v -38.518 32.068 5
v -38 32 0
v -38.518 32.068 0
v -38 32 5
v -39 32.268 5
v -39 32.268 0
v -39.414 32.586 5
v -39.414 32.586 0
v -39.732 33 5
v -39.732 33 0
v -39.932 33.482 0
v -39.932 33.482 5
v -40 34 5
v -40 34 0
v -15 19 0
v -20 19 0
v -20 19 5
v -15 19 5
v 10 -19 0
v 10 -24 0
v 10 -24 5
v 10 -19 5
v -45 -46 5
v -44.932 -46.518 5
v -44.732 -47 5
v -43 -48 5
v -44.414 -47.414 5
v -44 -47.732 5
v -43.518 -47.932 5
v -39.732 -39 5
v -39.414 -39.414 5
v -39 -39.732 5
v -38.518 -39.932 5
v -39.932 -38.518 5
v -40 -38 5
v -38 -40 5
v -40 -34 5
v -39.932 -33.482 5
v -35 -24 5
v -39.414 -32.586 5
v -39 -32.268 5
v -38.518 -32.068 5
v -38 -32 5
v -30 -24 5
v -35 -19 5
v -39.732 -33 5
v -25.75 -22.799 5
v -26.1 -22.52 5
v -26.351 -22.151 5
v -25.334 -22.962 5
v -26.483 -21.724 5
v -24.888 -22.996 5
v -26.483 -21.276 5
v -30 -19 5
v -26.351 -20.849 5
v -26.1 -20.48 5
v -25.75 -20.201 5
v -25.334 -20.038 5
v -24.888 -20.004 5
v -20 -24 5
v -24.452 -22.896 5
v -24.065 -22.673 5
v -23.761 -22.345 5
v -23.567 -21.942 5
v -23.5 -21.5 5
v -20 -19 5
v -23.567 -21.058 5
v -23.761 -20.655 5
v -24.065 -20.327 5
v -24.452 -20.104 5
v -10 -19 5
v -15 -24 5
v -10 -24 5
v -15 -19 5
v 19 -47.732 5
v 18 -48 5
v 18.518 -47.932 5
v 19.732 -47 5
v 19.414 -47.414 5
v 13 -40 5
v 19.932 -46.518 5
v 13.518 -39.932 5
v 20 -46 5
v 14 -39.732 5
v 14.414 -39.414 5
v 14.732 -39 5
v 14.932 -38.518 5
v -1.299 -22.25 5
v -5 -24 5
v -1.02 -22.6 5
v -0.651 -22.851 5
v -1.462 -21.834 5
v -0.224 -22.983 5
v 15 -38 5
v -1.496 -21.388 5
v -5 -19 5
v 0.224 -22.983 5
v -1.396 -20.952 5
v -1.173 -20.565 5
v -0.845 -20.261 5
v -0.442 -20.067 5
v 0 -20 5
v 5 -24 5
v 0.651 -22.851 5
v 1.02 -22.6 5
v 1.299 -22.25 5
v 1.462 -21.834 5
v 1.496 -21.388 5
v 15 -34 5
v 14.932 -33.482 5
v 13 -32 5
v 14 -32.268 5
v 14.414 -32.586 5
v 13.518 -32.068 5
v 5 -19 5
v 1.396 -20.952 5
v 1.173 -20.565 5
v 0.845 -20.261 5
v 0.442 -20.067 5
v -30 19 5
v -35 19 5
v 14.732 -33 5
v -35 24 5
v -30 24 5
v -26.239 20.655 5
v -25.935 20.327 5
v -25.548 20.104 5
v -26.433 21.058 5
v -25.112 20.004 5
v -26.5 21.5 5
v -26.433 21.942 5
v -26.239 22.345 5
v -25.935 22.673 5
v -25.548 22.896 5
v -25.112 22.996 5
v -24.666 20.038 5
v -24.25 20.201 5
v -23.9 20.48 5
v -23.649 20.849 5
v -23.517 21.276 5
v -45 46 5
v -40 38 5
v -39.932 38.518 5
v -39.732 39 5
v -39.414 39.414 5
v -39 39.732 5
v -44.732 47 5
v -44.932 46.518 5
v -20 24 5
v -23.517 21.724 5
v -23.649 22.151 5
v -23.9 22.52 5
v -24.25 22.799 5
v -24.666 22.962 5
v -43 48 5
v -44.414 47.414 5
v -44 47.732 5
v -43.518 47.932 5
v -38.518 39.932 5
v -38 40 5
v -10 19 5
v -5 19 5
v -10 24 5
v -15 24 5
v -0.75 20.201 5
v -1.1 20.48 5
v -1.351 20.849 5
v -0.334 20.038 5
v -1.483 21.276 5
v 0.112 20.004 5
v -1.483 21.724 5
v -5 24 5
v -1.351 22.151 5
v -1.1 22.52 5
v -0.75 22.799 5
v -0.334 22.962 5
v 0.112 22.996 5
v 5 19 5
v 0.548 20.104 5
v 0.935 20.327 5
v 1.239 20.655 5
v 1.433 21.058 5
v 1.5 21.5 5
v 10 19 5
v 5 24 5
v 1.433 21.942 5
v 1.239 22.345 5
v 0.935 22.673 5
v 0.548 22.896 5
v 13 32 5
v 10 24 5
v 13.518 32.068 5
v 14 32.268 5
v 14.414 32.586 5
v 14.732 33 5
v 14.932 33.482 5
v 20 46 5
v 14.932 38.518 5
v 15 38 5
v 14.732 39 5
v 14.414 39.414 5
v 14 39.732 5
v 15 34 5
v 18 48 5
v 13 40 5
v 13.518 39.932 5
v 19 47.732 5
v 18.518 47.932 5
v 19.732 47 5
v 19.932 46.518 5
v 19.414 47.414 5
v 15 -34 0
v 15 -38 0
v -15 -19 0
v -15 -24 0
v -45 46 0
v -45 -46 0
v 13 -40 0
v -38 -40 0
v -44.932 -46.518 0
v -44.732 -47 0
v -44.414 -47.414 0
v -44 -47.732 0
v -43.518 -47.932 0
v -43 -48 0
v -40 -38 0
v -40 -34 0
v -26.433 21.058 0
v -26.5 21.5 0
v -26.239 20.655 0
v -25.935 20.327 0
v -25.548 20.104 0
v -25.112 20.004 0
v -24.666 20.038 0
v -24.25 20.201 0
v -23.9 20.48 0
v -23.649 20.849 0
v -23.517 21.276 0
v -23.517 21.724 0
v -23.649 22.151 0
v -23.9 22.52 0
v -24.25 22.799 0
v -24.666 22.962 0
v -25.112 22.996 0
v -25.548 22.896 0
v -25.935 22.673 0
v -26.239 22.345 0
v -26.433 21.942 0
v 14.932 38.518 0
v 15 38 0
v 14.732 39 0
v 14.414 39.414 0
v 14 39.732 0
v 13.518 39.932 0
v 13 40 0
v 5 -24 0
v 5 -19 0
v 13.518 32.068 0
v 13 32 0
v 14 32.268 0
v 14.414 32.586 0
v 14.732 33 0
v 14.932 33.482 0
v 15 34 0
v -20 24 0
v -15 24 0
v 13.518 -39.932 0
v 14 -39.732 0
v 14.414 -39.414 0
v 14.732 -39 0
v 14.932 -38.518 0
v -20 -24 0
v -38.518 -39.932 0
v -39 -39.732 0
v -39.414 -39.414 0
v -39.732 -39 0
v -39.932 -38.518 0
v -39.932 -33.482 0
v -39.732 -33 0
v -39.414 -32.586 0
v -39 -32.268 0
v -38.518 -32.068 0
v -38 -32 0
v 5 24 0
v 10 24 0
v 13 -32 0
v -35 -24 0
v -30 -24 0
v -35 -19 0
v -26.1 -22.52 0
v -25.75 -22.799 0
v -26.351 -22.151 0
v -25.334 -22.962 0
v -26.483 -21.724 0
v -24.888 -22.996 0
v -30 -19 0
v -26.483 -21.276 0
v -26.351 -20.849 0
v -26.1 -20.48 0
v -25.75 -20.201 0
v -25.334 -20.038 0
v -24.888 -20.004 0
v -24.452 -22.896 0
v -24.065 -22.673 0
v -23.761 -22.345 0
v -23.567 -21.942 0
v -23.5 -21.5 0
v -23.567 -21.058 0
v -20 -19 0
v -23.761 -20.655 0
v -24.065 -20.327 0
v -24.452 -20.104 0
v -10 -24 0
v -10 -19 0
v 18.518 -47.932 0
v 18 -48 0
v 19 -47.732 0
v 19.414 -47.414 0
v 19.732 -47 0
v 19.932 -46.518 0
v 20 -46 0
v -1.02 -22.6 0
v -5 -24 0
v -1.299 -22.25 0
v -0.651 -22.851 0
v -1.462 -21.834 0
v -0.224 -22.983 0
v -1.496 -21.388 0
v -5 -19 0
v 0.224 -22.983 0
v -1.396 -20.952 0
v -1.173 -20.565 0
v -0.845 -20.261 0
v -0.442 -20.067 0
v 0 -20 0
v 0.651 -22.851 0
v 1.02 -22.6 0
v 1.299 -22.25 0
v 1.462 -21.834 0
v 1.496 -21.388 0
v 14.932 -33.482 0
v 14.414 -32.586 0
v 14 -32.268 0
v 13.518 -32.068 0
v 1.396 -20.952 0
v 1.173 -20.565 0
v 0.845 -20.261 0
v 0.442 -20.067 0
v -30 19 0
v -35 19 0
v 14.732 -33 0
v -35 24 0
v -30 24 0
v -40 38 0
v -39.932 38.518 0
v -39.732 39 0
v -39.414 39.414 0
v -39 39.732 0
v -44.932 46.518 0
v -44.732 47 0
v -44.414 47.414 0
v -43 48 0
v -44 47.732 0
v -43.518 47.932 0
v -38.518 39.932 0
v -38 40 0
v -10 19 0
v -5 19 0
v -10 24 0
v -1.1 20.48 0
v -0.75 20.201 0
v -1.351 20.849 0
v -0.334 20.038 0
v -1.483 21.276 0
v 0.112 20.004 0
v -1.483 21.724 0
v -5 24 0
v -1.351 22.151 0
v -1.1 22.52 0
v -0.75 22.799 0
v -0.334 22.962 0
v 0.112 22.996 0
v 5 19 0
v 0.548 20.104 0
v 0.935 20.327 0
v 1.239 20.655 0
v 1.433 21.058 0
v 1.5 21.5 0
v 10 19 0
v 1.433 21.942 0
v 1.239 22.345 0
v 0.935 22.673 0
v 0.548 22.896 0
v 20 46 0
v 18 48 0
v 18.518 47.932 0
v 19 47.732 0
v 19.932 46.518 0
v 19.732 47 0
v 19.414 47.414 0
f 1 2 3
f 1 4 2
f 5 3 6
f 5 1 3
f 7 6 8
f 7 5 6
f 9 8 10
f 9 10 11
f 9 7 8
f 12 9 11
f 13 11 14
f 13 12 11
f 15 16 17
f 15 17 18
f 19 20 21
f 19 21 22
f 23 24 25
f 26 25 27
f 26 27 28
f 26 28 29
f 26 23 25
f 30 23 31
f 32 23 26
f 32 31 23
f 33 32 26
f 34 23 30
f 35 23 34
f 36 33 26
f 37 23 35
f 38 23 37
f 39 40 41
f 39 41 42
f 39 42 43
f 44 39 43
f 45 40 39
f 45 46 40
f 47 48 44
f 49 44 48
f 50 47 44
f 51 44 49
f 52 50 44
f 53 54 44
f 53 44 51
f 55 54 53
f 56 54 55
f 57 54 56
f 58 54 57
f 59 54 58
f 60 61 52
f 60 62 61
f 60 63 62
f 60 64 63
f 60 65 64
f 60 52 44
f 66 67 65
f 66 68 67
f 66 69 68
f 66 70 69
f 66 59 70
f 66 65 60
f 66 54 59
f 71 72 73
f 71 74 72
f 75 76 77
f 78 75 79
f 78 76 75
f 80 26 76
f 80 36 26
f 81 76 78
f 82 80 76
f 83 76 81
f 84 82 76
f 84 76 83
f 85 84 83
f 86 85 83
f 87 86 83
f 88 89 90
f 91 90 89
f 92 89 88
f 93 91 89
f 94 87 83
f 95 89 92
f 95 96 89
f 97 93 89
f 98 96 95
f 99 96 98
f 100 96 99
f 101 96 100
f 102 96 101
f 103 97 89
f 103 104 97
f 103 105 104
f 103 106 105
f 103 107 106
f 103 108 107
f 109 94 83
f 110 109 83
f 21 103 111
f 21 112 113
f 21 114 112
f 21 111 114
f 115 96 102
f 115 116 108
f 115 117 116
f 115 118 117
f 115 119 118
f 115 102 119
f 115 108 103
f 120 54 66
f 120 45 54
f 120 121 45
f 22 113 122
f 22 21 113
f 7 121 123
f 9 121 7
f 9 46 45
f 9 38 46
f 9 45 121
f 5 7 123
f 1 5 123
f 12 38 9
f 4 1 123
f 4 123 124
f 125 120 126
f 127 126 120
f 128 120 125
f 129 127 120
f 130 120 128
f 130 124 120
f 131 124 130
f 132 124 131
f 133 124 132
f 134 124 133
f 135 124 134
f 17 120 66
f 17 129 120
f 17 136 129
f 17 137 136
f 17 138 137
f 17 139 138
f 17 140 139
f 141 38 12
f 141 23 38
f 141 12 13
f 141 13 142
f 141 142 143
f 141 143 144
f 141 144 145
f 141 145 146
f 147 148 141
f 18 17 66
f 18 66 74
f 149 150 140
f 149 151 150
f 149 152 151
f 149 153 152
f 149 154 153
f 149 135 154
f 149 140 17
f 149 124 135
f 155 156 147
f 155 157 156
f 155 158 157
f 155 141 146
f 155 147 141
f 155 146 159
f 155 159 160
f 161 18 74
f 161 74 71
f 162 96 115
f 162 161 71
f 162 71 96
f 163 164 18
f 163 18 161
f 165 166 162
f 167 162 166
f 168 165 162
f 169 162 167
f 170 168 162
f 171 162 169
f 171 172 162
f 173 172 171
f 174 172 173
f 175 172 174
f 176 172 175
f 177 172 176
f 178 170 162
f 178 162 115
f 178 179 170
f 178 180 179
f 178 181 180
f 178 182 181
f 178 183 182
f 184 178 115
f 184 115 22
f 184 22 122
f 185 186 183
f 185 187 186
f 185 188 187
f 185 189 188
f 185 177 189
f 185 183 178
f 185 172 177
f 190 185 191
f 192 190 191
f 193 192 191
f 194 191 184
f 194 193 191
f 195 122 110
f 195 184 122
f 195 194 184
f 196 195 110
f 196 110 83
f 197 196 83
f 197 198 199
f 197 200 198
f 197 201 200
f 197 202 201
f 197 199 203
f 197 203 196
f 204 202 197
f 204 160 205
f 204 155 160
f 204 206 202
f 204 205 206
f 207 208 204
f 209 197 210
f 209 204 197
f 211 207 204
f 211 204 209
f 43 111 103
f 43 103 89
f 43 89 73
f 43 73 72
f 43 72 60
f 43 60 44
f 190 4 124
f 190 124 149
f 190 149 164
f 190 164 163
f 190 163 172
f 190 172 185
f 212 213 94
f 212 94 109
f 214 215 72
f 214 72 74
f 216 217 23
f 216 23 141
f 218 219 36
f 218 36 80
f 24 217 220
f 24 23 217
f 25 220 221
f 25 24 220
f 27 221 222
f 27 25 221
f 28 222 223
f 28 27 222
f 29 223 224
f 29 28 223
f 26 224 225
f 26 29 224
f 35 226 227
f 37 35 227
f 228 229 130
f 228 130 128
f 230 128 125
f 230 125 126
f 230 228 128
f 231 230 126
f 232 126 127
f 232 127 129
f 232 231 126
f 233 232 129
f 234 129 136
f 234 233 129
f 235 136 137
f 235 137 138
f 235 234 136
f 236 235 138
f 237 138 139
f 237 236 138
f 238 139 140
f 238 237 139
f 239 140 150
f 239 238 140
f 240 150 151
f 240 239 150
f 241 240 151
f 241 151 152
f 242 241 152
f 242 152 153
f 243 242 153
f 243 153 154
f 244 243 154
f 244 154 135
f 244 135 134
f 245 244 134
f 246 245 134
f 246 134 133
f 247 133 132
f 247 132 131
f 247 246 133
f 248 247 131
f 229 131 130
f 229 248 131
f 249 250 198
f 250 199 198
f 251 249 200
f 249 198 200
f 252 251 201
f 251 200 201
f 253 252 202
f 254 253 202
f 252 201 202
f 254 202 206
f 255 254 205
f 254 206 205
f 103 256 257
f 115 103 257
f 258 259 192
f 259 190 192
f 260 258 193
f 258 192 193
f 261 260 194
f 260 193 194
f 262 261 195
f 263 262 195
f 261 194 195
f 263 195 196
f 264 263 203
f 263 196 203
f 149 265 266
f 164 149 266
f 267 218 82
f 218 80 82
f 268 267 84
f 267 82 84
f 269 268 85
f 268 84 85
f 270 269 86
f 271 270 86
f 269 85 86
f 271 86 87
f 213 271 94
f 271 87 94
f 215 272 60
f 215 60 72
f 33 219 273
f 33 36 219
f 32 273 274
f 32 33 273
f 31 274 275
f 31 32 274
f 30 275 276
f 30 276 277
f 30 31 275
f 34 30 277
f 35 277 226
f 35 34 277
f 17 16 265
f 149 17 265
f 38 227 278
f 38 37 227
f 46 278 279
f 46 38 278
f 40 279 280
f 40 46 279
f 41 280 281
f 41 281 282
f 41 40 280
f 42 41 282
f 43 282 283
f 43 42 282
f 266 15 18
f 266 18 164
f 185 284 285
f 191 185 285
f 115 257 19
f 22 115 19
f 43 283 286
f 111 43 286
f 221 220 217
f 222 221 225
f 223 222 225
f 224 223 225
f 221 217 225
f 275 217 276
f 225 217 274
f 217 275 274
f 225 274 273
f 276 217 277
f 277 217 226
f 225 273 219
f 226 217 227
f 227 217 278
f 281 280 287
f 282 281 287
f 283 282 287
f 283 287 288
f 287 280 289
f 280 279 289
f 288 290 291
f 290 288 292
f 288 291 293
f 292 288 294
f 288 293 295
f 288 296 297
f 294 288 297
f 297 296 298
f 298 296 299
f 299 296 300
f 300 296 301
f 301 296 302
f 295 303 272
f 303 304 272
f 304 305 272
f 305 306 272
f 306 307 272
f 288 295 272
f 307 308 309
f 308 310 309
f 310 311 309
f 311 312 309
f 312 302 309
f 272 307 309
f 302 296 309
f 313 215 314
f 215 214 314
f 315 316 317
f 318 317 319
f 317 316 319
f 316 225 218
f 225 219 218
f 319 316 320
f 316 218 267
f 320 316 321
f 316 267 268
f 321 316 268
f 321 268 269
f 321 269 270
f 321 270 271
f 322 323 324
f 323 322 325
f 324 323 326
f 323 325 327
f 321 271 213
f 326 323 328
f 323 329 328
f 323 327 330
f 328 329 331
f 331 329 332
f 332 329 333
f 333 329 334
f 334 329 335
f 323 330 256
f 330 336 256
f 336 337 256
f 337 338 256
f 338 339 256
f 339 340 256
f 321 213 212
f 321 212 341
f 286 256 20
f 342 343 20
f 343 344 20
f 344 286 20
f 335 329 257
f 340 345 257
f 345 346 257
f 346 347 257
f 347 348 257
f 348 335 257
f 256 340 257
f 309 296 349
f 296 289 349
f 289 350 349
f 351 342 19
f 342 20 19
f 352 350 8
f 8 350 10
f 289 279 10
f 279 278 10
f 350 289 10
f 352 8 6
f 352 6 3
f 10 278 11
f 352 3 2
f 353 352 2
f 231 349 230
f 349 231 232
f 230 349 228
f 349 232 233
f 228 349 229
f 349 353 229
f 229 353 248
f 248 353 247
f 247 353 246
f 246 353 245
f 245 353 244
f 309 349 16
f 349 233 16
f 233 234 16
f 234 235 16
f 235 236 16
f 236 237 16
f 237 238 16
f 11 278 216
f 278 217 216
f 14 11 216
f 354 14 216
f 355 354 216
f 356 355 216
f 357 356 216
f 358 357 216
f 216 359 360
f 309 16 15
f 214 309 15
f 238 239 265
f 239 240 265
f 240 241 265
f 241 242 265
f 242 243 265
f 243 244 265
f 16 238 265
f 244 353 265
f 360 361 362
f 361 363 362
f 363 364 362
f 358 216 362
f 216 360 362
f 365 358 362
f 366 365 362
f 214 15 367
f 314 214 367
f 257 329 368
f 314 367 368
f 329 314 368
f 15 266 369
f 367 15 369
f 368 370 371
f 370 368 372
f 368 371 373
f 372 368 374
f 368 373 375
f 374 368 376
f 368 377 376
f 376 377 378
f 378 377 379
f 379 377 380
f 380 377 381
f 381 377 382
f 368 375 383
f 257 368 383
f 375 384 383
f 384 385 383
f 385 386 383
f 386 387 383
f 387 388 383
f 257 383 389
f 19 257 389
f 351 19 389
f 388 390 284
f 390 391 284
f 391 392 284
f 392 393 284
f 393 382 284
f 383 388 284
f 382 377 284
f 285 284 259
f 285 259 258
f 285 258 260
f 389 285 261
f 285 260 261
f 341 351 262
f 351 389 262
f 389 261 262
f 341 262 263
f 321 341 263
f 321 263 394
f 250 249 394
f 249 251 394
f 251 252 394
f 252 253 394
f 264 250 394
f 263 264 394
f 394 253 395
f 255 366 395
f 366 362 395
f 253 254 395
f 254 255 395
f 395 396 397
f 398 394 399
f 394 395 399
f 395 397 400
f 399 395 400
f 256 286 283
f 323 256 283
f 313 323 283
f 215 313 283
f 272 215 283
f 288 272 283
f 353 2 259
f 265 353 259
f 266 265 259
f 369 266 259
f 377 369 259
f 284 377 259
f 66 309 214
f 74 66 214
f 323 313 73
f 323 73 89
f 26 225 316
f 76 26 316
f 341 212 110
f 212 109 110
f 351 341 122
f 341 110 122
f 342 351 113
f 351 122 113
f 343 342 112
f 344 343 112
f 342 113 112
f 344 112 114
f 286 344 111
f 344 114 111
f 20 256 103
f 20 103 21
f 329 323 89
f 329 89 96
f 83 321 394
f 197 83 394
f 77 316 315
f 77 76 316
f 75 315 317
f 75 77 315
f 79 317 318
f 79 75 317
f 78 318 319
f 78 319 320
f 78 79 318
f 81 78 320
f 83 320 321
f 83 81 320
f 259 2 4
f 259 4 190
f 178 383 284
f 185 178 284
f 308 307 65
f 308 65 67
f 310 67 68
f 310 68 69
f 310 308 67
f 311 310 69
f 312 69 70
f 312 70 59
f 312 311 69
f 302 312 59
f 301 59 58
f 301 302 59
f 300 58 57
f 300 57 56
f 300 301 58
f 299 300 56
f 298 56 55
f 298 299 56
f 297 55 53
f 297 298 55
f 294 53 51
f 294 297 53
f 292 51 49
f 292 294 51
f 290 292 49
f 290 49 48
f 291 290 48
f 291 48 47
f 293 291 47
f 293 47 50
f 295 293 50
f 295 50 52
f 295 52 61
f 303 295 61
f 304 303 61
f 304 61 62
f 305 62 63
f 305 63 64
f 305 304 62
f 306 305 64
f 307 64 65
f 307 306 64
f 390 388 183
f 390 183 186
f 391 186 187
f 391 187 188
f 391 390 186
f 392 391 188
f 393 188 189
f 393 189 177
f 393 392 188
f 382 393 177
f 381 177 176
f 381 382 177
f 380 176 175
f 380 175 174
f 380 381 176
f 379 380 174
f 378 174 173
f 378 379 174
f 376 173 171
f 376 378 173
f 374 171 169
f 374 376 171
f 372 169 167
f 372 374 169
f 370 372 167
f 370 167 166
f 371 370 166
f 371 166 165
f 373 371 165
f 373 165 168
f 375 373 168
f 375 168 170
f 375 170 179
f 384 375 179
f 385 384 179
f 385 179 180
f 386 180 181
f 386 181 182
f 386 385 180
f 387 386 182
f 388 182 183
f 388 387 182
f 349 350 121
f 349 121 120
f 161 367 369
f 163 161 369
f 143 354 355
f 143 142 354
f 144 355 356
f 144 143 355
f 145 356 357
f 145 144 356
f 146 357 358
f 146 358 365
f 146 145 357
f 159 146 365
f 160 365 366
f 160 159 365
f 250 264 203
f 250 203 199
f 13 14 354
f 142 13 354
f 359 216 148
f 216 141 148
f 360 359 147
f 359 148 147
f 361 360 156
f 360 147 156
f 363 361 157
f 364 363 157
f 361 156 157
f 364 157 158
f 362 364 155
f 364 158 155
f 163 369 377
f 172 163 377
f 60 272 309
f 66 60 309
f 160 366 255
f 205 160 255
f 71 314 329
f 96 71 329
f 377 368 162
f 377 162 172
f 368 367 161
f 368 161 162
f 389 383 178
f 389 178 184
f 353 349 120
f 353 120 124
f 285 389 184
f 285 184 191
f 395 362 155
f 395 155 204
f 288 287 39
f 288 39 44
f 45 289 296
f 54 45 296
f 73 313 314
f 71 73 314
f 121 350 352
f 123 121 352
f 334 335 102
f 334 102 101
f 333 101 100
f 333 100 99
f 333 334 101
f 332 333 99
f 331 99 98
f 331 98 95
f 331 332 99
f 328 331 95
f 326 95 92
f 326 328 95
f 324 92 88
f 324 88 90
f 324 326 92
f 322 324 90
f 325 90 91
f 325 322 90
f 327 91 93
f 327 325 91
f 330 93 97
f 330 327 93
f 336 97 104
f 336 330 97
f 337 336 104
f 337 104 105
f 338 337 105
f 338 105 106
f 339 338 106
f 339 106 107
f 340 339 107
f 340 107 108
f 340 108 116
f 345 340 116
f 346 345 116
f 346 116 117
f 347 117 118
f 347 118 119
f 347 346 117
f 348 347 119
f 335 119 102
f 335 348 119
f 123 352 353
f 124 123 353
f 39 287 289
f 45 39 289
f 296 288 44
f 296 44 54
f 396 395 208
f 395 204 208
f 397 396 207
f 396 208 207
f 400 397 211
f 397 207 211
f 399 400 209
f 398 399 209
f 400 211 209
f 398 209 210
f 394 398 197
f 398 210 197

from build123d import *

# Parameters (mm, degrees)
ESQUISSE1_W        = 65
ESQUISSE1_H        = 96
ESQUISSE1_R        = 1.5
ESQUISSE1_W_2      = 55
ESQUISSE1_H_2      = 8
ESQUISSE1_W_3      = 5
ESQUISSE1_H_3      = 5
BOSS_EXTRU_1_DEPTH = 5
CONG_1_R           = 2


with BuildPart() as part:
    # Esquisse1 → Boss.-Extru.1 (new body)
    with BuildSketch(Plane.XY):
        with Locations((-12.5, 0)):
            Rectangle(ESQUISSE1_W, ESQUISSE1_H)
        with Locations((0, 21.5)):
            Circle(ESQUISSE1_R, mode=Mode.SUBTRACT)
        with Locations(Location((0, -21.5, 0), (0, 0, 90))):
            Circle(ESQUISSE1_R, mode=Mode.SUBTRACT)
        with Locations(Location((-25, 21.5, 0), (0, 0, 180))):
            Circle(ESQUISSE1_R, mode=Mode.SUBTRACT)
        with Locations((-25, -21.5)):
            Circle(ESQUISSE1_R, mode=Mode.SUBTRACT)
        with Locations((-12.5, -36)):
            Rectangle(ESQUISSE1_W_2, ESQUISSE1_H_2, mode=Mode.SUBTRACT)
        with Locations((-12.5, 36)):
            Rectangle(ESQUISSE1_W_2, ESQUISSE1_H_2, mode=Mode.SUBTRACT)
        with Locations((-7.5, 21.5)):
            Rectangle(ESQUISSE1_W_3, ESQUISSE1_H_3, mode=Mode.SUBTRACT)
        with Locations((7.5, 21.5)):
            Rectangle(ESQUISSE1_W_3, ESQUISSE1_H_3, mode=Mode.SUBTRACT)
        with Locations((-7.5, -21.5)):
            Rectangle(ESQUISSE1_W_3, ESQUISSE1_H_3, mode=Mode.SUBTRACT)
        with Locations((7.5, -21.5)):
            Rectangle(ESQUISSE1_W_3, ESQUISSE1_H_3, mode=Mode.SUBTRACT)
        with Locations((-17.5, 21.5)):
            Rectangle(ESQUISSE1_W_3, ESQUISSE1_H_3, mode=Mode.SUBTRACT)
        with Locations((-32.5, 21.5)):
            Rectangle(ESQUISSE1_W_3, ESQUISSE1_H_3, mode=Mode.SUBTRACT)
        with Locations((-17.5, -21.5)):
            Rectangle(ESQUISSE1_W_3, ESQUISSE1_H_3, mode=Mode.SUBTRACT)
        with Locations((-32.5, -21.5)):
            Rectangle(ESQUISSE1_W_3, ESQUISSE1_H_3, mode=Mode.SUBTRACT)
    extrude(amount=BOSS_EXTRU_1_DEPTH)

    # Congé1
    cong_1_edges = [part.edges().sort_by_distance(p)[0] for p in [
        (-40, 40, 2.5),
        (-40, 32, 2.5),
        (15, 32, 2.5),
        (15, 40, 2.5),
        (-40, -40, 2.5),
        (15, -40, 2.5),
        (15, -32, 2.5),
        (-40, -32, 2.5),
        (-45, -48, 2.5),
        (-45, 48, 2.5),
        (20, 48, 2.5),
        (20, -48, 2.5),
    ]]
    fillet(cong_1_edges, radius=CONG_1_R)


solid = part.part
